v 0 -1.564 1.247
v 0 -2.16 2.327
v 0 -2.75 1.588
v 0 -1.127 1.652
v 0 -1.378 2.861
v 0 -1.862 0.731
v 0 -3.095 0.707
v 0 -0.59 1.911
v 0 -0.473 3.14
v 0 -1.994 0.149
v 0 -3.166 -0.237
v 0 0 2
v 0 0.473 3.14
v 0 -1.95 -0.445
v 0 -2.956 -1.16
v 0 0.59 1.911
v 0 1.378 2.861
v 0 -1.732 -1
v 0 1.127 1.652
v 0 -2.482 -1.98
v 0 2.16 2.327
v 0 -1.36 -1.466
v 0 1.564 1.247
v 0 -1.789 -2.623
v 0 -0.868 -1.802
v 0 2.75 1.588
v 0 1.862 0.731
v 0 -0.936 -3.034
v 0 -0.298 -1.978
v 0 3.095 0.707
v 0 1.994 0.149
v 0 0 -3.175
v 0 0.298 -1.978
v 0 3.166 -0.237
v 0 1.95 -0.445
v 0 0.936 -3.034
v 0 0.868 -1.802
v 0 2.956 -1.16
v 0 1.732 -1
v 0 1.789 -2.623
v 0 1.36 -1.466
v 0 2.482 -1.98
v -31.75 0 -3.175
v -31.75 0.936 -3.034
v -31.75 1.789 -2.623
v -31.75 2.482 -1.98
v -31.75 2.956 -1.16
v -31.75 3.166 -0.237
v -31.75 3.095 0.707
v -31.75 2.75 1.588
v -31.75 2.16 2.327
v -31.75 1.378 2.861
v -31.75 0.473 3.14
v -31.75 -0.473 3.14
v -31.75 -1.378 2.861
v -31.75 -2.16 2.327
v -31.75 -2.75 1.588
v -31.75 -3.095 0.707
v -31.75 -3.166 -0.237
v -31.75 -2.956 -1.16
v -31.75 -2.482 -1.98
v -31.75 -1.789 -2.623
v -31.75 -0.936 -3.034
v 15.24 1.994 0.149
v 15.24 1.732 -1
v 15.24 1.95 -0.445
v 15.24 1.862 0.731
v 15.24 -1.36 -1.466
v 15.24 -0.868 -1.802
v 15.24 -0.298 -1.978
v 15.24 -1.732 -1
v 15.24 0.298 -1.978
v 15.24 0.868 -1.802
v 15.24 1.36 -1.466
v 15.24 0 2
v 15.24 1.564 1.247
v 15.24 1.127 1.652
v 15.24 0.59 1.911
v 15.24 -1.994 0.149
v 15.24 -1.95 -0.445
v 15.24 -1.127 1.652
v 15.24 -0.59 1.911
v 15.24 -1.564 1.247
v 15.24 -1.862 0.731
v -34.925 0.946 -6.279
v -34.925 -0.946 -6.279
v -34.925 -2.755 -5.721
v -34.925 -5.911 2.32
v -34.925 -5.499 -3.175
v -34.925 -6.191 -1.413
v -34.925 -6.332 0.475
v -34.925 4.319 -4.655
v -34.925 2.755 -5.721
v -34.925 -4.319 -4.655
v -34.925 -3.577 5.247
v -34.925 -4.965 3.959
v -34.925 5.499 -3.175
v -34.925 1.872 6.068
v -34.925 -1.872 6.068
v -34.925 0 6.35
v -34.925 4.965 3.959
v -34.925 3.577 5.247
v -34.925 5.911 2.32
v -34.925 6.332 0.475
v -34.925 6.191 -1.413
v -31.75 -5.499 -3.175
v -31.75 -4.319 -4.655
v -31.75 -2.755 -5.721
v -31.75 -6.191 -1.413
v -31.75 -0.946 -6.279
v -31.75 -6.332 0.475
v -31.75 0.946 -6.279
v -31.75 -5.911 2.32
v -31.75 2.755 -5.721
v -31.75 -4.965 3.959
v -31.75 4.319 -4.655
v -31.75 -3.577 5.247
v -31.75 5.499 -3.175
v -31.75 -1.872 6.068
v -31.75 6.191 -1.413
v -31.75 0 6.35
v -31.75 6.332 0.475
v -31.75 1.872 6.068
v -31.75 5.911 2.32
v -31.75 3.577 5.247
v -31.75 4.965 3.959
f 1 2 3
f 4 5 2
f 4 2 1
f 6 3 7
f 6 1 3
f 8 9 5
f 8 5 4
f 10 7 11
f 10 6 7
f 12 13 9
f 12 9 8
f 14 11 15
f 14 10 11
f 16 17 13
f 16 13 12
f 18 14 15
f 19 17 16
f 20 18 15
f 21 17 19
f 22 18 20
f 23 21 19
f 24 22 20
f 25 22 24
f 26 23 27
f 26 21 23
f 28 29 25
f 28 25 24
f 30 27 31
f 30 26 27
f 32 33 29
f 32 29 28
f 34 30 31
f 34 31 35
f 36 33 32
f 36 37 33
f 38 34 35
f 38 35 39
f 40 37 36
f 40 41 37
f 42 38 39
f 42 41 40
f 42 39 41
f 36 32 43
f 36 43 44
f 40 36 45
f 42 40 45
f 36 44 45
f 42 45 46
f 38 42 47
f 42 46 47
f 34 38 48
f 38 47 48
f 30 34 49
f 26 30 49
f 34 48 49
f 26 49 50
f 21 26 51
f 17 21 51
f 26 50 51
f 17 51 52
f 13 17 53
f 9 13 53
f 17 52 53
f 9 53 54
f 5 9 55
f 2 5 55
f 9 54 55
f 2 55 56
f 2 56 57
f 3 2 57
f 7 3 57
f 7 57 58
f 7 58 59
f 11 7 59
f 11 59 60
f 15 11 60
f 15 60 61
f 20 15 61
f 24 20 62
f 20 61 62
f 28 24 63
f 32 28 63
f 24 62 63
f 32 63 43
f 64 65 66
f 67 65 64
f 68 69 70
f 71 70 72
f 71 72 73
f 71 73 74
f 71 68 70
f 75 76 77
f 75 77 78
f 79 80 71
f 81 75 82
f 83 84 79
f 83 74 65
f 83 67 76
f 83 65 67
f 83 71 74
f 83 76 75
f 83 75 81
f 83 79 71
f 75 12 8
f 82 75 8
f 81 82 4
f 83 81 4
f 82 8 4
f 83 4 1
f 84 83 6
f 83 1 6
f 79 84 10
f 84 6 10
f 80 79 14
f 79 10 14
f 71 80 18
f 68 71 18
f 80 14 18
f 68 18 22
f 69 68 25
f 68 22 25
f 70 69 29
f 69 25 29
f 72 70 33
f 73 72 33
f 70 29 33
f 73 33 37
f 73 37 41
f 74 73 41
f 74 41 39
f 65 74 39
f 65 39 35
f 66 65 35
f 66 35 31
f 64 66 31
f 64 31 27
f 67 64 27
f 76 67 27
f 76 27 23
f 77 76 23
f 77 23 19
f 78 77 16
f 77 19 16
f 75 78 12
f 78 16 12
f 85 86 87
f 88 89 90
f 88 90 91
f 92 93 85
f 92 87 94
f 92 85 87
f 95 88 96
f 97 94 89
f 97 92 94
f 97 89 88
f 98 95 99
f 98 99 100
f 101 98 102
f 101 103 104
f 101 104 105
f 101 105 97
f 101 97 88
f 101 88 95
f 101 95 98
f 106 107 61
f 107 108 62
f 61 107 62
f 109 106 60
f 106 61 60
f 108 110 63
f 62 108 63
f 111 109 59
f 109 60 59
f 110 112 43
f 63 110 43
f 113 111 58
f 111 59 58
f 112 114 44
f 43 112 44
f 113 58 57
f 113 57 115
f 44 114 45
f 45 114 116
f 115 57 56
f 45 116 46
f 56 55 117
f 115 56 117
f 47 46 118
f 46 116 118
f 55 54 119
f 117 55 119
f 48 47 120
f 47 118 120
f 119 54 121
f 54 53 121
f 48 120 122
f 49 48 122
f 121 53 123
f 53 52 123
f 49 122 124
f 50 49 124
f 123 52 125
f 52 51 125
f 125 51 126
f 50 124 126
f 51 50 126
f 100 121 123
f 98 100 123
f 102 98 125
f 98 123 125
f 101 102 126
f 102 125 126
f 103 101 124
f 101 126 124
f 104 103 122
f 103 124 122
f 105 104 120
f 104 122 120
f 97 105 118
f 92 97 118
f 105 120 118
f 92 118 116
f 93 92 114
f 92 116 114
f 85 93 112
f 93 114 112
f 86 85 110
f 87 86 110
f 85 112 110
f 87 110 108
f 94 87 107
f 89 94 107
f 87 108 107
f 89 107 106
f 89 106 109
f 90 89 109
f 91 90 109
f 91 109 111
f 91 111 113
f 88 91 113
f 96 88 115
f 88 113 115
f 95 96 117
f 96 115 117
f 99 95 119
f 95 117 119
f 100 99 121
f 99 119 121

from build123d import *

# Parameters (mm, degrees)
SKETCH1_R           = 2
BOSS_EXTRUDE1_DEPTH = 15.24
SKETCH1_3_R         = 3.175
BOSS_EXTRUDE2_DEPTH = 31.75
SKETCH2_R           = 6.35
BOSS_EXTRUDE3_DEPTH = 3.175


with BuildPart() as part:
    # Sketch1 → Boss-Extrude1 (new body)
    with BuildSketch(Plane(origin=(0, 0, 0), x_dir=(0, 0, -1), z_dir=(1, 0, 0))):
        Circle(SKETCH1_R)
    extrude(amount=BOSS_EXTRUDE1_DEPTH)

    # Sketch1<3> → Boss-Extrude2 (add)
    with BuildSketch(Plane(origin=(0, 0, 0), x_dir=(0, 0, -1), z_dir=(1, 0, 0))):
        Circle(SKETCH1_3_R)
    extrude(amount=-BOSS_EXTRUDE2_DEPTH)

    # Sketch2 → Boss-Extrude3 (add)
    with BuildSketch(Plane.ZY.offset(31.75)):
        Circle(SKETCH2_R)
    extrude(amount=BOSS_EXTRUDE3_DEPTH)


solid = part.part
